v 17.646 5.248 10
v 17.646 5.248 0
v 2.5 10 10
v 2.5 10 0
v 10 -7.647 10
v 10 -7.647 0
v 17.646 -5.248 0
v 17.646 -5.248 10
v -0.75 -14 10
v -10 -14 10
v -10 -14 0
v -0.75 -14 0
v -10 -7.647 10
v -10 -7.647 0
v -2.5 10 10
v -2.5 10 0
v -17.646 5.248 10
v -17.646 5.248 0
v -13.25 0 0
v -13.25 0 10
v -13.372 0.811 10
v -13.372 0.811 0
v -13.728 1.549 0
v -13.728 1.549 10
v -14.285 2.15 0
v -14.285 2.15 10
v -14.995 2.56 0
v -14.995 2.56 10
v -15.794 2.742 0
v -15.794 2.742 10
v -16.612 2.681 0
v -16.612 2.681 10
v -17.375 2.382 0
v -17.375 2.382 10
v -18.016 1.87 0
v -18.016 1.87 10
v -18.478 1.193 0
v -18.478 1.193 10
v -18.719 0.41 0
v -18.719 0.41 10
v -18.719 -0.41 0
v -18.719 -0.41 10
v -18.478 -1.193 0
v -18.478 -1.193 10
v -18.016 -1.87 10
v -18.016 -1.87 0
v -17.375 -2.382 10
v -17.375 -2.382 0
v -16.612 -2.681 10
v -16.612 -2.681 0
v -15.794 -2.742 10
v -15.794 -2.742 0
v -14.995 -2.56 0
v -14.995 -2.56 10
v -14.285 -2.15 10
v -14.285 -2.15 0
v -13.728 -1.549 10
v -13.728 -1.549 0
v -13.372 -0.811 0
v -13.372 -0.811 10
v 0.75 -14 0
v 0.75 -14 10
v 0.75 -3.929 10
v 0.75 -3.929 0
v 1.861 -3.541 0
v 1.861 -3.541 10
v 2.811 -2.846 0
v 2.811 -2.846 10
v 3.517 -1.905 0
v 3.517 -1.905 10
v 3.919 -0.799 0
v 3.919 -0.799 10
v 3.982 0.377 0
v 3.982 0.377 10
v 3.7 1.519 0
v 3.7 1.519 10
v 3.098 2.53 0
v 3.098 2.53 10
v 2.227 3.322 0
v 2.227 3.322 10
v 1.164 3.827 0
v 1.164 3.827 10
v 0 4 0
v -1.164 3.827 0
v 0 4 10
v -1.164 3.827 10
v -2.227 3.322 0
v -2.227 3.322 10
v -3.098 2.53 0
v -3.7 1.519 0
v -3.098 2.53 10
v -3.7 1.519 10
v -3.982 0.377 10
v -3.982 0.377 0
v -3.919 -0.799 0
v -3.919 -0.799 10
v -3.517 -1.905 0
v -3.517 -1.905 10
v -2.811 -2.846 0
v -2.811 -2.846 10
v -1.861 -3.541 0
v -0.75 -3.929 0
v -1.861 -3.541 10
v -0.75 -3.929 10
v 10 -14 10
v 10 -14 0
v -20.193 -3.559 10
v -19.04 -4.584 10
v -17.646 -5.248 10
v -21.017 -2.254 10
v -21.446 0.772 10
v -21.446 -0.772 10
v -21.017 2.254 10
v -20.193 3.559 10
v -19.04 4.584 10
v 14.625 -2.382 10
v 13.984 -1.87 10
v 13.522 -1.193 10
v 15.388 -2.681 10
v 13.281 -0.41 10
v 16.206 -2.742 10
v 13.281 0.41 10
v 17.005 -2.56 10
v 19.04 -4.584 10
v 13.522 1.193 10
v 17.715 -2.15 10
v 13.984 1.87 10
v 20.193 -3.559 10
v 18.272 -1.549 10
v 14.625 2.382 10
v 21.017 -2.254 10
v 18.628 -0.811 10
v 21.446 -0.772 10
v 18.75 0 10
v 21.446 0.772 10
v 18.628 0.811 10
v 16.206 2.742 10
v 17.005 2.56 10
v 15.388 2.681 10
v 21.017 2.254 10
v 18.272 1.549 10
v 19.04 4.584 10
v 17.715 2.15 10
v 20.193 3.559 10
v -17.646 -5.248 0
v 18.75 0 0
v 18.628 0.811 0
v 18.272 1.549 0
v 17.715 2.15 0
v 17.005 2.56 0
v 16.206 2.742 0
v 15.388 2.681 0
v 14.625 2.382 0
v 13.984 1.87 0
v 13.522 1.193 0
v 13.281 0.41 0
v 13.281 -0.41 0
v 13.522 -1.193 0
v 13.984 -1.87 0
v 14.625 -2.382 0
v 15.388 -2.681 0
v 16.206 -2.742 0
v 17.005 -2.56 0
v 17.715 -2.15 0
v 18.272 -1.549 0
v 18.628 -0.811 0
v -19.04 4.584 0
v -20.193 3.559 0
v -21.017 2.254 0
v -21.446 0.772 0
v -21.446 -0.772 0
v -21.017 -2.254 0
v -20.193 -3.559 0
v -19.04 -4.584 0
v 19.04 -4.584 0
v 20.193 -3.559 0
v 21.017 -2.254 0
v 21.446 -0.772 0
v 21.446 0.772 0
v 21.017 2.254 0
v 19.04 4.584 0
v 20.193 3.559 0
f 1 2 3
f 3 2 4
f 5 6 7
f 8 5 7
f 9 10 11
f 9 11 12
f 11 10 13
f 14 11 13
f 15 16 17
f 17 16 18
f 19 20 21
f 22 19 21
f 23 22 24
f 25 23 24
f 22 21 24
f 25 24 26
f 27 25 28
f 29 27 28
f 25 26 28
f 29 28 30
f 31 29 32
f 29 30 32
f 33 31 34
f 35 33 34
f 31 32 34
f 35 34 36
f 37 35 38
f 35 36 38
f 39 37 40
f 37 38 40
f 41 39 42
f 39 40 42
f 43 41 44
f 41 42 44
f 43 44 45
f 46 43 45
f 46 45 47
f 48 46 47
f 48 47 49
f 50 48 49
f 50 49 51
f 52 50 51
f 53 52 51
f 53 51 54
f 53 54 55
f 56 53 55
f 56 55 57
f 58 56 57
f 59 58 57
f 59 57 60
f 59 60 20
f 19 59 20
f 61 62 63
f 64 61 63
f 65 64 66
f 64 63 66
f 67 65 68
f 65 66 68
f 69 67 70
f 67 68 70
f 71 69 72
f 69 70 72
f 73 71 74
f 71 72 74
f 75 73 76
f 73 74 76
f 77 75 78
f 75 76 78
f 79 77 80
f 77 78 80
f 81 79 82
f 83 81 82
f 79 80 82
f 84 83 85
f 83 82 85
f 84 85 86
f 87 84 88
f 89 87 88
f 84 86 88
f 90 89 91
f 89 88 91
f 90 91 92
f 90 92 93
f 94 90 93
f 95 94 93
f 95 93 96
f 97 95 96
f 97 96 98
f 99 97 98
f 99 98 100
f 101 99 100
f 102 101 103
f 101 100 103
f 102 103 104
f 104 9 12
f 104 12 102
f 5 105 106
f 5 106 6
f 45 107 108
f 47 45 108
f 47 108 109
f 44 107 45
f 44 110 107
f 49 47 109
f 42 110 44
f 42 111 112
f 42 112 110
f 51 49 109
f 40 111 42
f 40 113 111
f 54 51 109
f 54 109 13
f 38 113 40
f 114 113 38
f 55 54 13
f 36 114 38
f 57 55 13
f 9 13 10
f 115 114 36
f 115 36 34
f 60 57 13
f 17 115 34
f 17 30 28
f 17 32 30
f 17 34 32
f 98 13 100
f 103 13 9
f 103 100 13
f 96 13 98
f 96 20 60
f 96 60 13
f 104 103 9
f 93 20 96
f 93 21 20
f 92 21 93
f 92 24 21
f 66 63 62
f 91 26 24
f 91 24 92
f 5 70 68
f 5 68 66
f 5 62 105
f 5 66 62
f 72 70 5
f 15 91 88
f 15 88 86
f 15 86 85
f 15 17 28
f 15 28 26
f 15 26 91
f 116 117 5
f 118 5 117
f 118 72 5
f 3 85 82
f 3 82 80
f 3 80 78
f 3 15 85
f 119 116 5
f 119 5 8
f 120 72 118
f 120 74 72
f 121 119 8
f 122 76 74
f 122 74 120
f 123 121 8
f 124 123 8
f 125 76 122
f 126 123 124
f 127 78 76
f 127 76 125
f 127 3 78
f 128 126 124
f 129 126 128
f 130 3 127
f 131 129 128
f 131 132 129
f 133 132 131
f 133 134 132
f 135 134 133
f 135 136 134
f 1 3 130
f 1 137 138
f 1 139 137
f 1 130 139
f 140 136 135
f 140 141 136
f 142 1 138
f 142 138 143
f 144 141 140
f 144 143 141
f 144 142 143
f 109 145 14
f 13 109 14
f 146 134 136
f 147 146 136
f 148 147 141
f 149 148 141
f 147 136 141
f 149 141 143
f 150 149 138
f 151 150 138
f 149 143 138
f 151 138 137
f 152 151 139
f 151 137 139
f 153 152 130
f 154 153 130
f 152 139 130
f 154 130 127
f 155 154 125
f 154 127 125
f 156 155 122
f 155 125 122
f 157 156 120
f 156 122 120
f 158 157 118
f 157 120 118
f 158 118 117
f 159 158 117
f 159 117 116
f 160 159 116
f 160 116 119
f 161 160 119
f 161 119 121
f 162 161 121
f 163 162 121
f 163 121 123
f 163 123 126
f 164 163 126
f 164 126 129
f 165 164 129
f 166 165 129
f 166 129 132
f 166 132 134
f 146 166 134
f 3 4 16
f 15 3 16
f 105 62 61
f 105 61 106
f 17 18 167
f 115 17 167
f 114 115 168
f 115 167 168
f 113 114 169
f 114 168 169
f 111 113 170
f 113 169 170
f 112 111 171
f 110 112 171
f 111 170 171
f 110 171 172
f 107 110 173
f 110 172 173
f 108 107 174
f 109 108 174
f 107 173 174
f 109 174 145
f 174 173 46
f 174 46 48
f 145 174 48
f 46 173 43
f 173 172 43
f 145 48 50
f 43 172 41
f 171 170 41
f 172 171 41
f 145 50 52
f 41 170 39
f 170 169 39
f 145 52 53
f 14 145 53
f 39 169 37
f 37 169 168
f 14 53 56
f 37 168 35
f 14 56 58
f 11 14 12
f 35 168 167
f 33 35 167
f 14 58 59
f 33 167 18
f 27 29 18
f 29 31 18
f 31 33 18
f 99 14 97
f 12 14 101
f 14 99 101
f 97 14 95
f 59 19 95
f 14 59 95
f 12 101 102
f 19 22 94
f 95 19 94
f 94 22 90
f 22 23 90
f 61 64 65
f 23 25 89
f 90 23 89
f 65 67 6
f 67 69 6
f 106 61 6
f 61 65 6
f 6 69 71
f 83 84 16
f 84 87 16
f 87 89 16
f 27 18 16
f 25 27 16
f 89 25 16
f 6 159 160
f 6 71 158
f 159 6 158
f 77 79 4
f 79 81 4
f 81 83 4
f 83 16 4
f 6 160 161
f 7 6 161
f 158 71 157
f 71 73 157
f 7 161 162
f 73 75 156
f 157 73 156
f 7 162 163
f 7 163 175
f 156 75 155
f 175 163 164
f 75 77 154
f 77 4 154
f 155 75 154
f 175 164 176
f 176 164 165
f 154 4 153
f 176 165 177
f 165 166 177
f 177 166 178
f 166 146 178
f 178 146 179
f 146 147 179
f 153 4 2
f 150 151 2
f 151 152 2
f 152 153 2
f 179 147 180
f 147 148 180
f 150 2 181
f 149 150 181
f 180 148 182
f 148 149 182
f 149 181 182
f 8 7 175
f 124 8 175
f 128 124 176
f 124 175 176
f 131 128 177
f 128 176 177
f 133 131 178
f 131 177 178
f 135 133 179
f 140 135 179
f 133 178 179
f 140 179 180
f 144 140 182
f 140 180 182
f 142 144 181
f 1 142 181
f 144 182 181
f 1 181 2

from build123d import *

# Parameters (mm, degrees)
EXTRUDE_1_DEPTH     = 10
SKETCH_2_W          = 20
SKETCH_2_H          = 14
EXTRUDE_2_DEPTH     = 10
CUT_EXTRUDE_1_REACH = 29.536
SKETCH_3_R          = 4
SKETCH_3_R_2        = 2.75
CUT_EXTRUDE_2_REACH = 29.536
SKETCH_4_W          = 1.5
SKETCH_4_H          = 14


with BuildPart() as part:
    # 草图1 → 凸台-拉伸1 (new body)
    with BuildSketch(Plane.XY):
        with BuildLine():
            Line((-17.646494004, -5.247766906), (-2.5, -10))
            Line((-2.5, -10), (2.5, -10))
            Line((2.5, -10), (17.646494004, -5.247766906))
            ThreePointArc((17.646494004, -5.247766906), (21.5, 0), (17.646494004, 5.247766906))
            Line((17.646494004, 5.247766906), (2.5, 10))
            Line((2.5, 10), (-2.5, 10))
            Line((-2.5, 10), (-17.646494004, 5.247766906))
            ThreePointArc((-17.646494004, 5.247766906), (-21.5, 0), (-17.646494004, -5.247766906))
        make_face()
    extrude(amount=EXTRUDE_1_DEPTH)

    # 草图2 → 凸台-拉伸2 (add)
    with BuildSketch(Plane.XY.offset(10)):
        with Locations((0, -7)):
            Rectangle(SKETCH_2_W, SKETCH_2_H)
    extrude(amount=-EXTRUDE_2_DEPTH)

    # 草图3 → 切除-拉伸1 (cut, up to next)
    with BuildSketch(Plane.XY.offset(10), mode=Mode.PRIVATE) as cut_extrude_1_sk1:
        Circle(SKETCH_3_R)
    cut_extrude_1_tool1 = extrude(cut_extrude_1_sk1.sketch, amount=-CUT_EXTRUDE_1_REACH, mode=Mode.PRIVATE) & part.part
    # 草图3 → 切除-拉伸1 (cut, up to next)
    with BuildSketch(Plane.XY.offset(10), mode=Mode.PRIVATE) as cut_extrude_1_sk2:
        with Locations((-16, 0)):
            Circle(SKETCH_3_R_2)
    cut_extrude_1_tool2 = extrude(cut_extrude_1_sk2.sketch, amount=-CUT_EXTRUDE_1_REACH, mode=Mode.PRIVATE) & part.part
    # 草图3 → 切除-拉伸1 (cut, up to next)
    with BuildSketch(Plane.XY.offset(10), mode=Mode.PRIVATE) as cut_extrude_1_sk3:
        with Locations((16, 0)):
            Circle(SKETCH_3_R_2)
    cut_extrude_1_tool3 = extrude(cut_extrude_1_sk3.sketch, amount=-CUT_EXTRUDE_1_REACH, mode=Mode.PRIVATE) & part.part
    add(cut_extrude_1_tool1.solids().sort_by_distance((0, 0, 10))[0], mode=Mode.SUBTRACT)
    add(cut_extrude_1_tool2.solids().sort_by_distance((-16, 0, 10))[0], mode=Mode.SUBTRACT)
    add(cut_extrude_1_tool3.solids().sort_by_distance((16, 0, 10))[0], mode=Mode.SUBTRACT)

    # 草图4 → 切除-拉伸2 (cut, up to next)
    with BuildSketch(Plane.XY.offset(10), mode=Mode.PRIVATE) as cut_extrude_2_sk1:
        with Locations((0, -7)):
            Rectangle(SKETCH_4_W, SKETCH_4_H)
    cut_extrude_2_tool1 = extrude(cut_extrude_2_sk1.sketch, amount=-CUT_EXTRUDE_2_REACH, mode=Mode.PRIVATE) & part.part
    add(cut_extrude_2_tool1.solids().sort_by_distance((0, -7, 10))[0], mode=Mode.SUBTRACT)


solid = part.part
